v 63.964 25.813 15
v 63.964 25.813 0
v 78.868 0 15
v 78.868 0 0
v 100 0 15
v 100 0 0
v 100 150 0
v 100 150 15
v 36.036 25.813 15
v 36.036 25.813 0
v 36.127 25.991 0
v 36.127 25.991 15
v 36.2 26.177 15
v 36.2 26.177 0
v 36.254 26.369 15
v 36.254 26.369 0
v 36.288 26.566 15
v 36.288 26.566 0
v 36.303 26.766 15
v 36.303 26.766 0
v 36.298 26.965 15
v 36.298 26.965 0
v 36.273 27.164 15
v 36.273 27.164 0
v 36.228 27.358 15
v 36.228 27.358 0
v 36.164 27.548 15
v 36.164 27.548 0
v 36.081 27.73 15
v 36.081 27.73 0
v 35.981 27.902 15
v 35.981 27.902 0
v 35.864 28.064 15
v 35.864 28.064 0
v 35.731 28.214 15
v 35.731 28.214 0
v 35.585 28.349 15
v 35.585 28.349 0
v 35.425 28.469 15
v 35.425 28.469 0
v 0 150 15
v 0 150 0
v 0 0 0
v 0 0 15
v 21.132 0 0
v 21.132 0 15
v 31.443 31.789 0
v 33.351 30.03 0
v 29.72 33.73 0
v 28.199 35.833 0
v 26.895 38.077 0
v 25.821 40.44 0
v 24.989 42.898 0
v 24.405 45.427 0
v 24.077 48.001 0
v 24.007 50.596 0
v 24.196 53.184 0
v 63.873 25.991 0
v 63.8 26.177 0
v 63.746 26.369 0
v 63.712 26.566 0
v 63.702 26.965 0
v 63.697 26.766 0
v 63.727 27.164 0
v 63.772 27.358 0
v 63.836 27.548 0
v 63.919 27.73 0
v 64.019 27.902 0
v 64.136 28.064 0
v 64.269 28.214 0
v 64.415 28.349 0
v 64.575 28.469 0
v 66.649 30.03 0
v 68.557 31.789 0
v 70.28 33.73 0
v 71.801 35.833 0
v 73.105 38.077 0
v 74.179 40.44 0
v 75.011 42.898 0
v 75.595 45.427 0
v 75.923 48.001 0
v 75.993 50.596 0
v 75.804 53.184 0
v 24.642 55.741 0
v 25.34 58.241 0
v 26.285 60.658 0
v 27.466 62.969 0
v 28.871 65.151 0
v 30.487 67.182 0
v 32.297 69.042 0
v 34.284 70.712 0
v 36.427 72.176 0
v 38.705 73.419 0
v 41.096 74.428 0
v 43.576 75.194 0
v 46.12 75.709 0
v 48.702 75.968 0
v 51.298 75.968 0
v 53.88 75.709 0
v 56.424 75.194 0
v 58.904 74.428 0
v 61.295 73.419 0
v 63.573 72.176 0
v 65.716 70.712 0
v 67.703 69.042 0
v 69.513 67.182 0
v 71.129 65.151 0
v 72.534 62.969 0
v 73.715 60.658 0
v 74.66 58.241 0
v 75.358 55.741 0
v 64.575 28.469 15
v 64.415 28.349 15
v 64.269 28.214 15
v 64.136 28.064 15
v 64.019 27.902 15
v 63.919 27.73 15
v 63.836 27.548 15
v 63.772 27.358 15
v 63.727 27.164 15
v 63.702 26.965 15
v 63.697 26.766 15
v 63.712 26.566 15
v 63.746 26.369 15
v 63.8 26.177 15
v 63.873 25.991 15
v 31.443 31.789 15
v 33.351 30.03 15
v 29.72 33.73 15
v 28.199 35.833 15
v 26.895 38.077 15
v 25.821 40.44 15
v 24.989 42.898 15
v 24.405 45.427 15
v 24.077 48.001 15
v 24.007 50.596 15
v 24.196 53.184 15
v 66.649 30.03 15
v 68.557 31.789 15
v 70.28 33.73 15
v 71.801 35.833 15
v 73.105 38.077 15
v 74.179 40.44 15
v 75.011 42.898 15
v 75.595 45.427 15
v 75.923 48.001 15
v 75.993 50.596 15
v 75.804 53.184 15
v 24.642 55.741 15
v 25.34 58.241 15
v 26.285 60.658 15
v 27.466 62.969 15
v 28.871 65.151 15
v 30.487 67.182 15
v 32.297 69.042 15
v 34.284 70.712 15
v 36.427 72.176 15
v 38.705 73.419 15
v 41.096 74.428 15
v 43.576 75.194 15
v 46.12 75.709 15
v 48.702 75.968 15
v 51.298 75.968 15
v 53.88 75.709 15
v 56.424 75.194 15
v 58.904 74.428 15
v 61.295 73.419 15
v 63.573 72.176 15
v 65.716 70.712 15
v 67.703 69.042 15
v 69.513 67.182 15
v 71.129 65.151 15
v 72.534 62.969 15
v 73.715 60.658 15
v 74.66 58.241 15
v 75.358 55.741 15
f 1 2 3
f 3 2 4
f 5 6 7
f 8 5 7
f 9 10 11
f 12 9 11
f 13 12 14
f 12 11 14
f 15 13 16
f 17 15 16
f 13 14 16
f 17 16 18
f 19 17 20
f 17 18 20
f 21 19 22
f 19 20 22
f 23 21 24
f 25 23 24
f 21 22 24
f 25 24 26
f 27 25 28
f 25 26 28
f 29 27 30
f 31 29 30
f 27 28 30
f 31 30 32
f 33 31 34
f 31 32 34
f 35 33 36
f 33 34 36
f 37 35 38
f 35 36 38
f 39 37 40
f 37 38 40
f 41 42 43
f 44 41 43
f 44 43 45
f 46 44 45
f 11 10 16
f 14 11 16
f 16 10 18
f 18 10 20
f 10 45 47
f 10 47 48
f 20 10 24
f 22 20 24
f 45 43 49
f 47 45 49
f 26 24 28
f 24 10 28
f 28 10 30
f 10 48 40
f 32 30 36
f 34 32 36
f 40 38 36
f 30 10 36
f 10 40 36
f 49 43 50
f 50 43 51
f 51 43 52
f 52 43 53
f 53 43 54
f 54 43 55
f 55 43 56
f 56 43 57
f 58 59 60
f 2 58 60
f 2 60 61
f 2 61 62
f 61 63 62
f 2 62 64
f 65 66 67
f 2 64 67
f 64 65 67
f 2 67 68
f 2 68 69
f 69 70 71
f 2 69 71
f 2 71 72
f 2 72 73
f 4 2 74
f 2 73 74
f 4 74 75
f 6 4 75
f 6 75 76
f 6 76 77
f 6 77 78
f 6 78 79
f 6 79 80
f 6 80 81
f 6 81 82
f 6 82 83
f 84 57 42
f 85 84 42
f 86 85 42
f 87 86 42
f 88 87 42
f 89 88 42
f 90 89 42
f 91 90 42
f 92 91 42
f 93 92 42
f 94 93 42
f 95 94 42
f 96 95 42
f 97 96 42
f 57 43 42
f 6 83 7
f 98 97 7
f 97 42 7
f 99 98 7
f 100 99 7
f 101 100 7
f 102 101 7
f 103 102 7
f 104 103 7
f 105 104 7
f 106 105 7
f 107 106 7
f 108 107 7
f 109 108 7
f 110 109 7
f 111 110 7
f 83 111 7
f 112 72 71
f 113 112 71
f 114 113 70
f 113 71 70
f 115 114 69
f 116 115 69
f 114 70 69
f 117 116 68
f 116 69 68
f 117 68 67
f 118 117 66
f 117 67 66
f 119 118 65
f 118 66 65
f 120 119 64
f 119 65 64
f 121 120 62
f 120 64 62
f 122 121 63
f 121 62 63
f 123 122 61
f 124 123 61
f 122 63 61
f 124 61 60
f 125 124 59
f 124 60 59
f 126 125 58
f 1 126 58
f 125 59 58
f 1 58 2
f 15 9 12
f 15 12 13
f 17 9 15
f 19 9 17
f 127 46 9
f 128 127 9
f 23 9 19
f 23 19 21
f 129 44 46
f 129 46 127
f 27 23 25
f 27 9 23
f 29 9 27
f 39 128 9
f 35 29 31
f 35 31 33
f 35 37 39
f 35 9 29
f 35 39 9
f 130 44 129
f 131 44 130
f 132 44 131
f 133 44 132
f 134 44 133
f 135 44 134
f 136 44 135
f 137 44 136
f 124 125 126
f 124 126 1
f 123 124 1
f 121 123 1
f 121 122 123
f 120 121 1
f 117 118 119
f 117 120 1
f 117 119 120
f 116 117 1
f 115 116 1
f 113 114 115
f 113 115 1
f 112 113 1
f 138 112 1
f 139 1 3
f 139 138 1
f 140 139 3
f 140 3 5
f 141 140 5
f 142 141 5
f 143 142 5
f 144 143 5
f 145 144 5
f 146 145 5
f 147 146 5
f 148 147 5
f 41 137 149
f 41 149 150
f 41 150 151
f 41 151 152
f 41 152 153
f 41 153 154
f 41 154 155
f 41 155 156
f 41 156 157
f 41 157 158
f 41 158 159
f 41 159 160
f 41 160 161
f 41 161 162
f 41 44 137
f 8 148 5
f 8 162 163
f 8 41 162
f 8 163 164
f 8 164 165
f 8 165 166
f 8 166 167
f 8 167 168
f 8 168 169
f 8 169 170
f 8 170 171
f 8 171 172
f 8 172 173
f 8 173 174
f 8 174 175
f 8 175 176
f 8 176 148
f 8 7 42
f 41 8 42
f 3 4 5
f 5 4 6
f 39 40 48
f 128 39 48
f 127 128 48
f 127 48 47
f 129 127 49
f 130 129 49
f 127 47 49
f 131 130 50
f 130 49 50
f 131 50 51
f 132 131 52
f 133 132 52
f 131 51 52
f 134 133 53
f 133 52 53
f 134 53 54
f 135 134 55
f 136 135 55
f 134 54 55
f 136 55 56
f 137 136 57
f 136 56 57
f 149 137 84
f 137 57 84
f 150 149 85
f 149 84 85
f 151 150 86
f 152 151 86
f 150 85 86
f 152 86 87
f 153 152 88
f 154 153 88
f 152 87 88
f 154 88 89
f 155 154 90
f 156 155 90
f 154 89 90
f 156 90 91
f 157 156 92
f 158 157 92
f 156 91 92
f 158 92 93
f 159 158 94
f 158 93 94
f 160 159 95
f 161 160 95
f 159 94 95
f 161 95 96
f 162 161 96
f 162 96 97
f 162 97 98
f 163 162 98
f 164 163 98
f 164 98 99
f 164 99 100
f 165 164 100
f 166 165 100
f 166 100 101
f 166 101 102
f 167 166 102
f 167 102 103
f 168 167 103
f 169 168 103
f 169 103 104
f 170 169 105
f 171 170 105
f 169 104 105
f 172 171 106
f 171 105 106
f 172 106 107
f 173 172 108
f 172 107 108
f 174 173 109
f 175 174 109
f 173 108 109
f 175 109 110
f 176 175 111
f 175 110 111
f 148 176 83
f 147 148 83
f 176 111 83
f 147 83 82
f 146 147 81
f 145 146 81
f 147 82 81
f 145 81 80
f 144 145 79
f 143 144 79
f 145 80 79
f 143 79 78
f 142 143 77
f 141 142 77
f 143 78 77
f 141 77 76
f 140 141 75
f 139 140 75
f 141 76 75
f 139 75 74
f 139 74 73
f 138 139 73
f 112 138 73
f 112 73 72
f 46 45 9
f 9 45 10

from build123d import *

# Parameters (mm, degrees)
F1_DEPTH = 15


with BuildPart() as f1:
    # F0 (on Top) → F1 (new body)
    with BuildSketch(Plane.XY):
        with BuildLine():
            Line((0, 150), (0, 0))
            Line((0, 0), (21.132487, 0))
            Line((21.132487, 0), (36.03576, 25.813227))
            ThreePointArc((36.03576, 25.813227), (36.252826, 27.261495), (35.424873, 28.469425))
            ThreePointArc((35.424873, 28.469425), (50, 76), (64.575127, 28.469425))
            ThreePointArc((64.575127, 28.469425), (63.747174, 27.261495), (63.96424, 25.813227))
            Line((63.96424, 25.813227), (78.867513, 0))
            Line((78.867513, 0), (100, 0))
            Line((100, 0), (100, 150))
            Line((100, 150), (0, 150))
        make_face()
    extrude(amount=F1_DEPTH)


solid = f1.part
